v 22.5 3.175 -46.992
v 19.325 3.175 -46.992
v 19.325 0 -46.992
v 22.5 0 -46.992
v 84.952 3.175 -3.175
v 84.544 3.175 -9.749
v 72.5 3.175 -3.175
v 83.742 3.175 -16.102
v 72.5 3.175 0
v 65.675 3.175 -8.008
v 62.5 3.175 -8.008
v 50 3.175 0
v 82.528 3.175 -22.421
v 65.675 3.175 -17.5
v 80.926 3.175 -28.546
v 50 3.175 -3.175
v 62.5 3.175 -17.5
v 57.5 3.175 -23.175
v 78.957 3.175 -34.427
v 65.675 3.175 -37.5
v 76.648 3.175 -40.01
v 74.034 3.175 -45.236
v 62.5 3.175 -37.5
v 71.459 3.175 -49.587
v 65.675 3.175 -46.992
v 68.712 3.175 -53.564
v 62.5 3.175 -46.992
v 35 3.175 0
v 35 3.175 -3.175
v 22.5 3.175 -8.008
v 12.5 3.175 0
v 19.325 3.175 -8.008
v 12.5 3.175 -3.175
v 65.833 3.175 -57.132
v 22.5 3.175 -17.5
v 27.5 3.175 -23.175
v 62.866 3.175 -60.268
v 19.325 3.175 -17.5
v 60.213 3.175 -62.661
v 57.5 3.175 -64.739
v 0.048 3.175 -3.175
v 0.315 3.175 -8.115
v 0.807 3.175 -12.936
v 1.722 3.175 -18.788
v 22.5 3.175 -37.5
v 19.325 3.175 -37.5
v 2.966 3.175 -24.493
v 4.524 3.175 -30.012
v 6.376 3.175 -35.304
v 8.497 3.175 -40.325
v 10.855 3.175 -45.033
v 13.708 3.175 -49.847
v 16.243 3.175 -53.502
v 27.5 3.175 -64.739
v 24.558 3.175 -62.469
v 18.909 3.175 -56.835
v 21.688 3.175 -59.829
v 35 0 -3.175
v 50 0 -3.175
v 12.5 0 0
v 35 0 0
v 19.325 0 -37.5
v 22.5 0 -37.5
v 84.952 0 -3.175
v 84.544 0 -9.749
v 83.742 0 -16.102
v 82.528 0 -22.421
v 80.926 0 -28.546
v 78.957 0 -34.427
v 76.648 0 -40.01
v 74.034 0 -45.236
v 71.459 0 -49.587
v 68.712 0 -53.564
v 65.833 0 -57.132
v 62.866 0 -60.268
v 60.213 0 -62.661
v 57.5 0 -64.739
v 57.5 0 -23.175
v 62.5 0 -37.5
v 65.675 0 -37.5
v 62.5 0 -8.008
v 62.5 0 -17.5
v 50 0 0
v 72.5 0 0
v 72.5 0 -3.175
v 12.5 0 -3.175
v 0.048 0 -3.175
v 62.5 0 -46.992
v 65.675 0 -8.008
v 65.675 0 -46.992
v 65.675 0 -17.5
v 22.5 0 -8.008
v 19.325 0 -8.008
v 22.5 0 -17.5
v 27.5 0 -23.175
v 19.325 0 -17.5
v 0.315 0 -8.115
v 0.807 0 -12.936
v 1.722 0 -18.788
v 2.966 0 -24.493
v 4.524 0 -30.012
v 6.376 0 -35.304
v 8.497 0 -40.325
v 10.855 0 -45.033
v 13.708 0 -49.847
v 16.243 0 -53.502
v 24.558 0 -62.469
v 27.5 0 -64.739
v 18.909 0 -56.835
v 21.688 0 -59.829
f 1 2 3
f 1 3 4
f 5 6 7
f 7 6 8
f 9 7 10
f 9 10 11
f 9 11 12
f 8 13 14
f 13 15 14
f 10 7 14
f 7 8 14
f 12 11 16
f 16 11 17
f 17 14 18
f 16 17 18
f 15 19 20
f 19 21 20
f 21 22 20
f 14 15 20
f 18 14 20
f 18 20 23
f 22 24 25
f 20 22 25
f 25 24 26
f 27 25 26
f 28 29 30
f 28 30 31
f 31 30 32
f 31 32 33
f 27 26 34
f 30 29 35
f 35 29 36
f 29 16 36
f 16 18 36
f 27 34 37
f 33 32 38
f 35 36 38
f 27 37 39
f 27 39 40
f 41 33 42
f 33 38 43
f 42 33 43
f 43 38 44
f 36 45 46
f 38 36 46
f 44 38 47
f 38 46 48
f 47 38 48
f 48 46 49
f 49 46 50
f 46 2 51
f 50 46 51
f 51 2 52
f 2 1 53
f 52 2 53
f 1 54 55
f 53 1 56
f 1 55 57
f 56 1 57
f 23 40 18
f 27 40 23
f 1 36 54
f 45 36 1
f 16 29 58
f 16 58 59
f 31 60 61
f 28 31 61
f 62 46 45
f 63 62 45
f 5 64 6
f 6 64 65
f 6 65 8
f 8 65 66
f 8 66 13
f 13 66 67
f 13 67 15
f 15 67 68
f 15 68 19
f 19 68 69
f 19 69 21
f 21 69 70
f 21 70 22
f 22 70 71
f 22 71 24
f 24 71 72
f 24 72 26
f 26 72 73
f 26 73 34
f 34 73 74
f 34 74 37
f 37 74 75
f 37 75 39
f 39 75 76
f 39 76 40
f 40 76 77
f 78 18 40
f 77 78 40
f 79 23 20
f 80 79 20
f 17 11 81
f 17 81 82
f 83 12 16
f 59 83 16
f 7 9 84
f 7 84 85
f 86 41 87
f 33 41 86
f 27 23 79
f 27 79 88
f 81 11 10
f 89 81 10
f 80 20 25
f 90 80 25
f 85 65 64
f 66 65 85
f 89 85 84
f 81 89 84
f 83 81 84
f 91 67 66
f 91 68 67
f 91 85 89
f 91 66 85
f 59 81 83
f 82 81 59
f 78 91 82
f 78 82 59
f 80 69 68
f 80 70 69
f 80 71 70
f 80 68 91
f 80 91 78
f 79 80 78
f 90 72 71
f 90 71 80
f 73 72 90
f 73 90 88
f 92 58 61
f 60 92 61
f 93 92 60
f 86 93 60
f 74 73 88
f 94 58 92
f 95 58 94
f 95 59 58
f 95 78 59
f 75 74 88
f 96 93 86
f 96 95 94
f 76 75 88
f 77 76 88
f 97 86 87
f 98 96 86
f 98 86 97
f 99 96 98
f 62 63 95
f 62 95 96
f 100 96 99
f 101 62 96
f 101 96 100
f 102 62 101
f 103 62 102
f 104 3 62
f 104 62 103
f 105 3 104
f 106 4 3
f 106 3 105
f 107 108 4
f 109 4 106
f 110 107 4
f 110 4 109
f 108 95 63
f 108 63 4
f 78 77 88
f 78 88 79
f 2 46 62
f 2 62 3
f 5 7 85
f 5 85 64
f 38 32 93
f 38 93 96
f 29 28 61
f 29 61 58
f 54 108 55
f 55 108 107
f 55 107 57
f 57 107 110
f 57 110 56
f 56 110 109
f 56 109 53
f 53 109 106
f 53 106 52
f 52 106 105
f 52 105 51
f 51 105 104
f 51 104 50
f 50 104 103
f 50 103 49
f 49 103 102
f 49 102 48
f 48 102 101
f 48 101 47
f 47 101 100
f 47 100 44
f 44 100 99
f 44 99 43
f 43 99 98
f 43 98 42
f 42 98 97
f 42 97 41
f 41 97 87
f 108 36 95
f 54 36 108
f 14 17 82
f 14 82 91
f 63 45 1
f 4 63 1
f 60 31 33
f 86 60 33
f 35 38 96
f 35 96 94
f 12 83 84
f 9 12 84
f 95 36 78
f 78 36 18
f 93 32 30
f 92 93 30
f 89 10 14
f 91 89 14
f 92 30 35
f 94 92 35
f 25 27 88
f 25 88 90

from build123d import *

# Parameters (mm, degrees)
BOSS_EXTRUDE1_DEPTH = 3.175
SKETCH2_W           = 3.175
SKETCH2_H           = 9.492
SKETCH2_W_2         = 12.5
SKETCH2_H_2         = 3.175
SKETCH2_W_3         = 15
SKETCH2_W_4         = 30
SKETCH2_H_3         = 55.059917187
CUT_EXTRUDE1_DEPTH  = 4.1750001


with BuildPart() as part:
    # Sketch1 → Boss-Extrude1 (new body)
    with BuildSketch(Plane(origin=(0, 0, 0), x_dir=(1, 0, 0), z_dir=(0, 1, 0))):
        with BuildLine():
            add(Edge.make_bspline(
                [(0, 0), (0, 36), (20.5, 67.166666667), (40.5, 70), (42.5, 70)],
                knots=[0, 0, 0, 0, 0.45, 0.5, 0.5, 0.5, 0.5], degree=3))
            Line((0, 0), (42.5, 0))
            Line((42.5, 0), (42.5, 70))
        make_face()
        with BuildLine():
            Line((42.5, 70), (42.5, 0))
            Line((42.5, 0), (85, 0))
            add(Edge.make_bspline(
                [(42.5, 70), (44.5, 70), (64.5, 67.166666667), (85, 36), (85, 0)],
                knots=[0.5, 0.5, 0.5, 0.5, 0.55, 1, 1, 1, 1], degree=3))
        make_face()
    extrude(amount=BOSS_EXTRUDE1_DEPTH)

    # Sketch2 → Cut-Extrude1 (cut, through all)
    with BuildSketch(Plane(origin=(0, 3.175, 0), x_dir=(1, 0, 0), z_dir=(0, 1, 0))):
        with Locations((20.9125, 42.246)):
            Rectangle(SKETCH2_W, SKETCH2_H)
        with Locations((64.0875, 42.246)):
            Rectangle(SKETCH2_W, SKETCH2_H)
        with Locations((20.9125, 12.754)):
            Rectangle(SKETCH2_W, SKETCH2_H)
        with Locations((64.0875, 12.754)):
            Rectangle(SKETCH2_W, SKETCH2_H)
        with Locations((6.25, 1.5875)):
            Rectangle(SKETCH2_W_2, SKETCH2_H_2)
        with Locations((42.5, 1.5875)):
            Rectangle(SKETCH2_W_3, SKETCH2_H_2)
        with Locations((78.75, 1.5875)):
            Rectangle(SKETCH2_W_2, SKETCH2_H_2)
        with Locations((42.5, 50.704958594)):
            Rectangle(SKETCH2_W_4, SKETCH2_H_3)
    extrude(amount=-CUT_EXTRUDE1_DEPTH, mode=Mode.SUBTRACT)


solid = part.part
